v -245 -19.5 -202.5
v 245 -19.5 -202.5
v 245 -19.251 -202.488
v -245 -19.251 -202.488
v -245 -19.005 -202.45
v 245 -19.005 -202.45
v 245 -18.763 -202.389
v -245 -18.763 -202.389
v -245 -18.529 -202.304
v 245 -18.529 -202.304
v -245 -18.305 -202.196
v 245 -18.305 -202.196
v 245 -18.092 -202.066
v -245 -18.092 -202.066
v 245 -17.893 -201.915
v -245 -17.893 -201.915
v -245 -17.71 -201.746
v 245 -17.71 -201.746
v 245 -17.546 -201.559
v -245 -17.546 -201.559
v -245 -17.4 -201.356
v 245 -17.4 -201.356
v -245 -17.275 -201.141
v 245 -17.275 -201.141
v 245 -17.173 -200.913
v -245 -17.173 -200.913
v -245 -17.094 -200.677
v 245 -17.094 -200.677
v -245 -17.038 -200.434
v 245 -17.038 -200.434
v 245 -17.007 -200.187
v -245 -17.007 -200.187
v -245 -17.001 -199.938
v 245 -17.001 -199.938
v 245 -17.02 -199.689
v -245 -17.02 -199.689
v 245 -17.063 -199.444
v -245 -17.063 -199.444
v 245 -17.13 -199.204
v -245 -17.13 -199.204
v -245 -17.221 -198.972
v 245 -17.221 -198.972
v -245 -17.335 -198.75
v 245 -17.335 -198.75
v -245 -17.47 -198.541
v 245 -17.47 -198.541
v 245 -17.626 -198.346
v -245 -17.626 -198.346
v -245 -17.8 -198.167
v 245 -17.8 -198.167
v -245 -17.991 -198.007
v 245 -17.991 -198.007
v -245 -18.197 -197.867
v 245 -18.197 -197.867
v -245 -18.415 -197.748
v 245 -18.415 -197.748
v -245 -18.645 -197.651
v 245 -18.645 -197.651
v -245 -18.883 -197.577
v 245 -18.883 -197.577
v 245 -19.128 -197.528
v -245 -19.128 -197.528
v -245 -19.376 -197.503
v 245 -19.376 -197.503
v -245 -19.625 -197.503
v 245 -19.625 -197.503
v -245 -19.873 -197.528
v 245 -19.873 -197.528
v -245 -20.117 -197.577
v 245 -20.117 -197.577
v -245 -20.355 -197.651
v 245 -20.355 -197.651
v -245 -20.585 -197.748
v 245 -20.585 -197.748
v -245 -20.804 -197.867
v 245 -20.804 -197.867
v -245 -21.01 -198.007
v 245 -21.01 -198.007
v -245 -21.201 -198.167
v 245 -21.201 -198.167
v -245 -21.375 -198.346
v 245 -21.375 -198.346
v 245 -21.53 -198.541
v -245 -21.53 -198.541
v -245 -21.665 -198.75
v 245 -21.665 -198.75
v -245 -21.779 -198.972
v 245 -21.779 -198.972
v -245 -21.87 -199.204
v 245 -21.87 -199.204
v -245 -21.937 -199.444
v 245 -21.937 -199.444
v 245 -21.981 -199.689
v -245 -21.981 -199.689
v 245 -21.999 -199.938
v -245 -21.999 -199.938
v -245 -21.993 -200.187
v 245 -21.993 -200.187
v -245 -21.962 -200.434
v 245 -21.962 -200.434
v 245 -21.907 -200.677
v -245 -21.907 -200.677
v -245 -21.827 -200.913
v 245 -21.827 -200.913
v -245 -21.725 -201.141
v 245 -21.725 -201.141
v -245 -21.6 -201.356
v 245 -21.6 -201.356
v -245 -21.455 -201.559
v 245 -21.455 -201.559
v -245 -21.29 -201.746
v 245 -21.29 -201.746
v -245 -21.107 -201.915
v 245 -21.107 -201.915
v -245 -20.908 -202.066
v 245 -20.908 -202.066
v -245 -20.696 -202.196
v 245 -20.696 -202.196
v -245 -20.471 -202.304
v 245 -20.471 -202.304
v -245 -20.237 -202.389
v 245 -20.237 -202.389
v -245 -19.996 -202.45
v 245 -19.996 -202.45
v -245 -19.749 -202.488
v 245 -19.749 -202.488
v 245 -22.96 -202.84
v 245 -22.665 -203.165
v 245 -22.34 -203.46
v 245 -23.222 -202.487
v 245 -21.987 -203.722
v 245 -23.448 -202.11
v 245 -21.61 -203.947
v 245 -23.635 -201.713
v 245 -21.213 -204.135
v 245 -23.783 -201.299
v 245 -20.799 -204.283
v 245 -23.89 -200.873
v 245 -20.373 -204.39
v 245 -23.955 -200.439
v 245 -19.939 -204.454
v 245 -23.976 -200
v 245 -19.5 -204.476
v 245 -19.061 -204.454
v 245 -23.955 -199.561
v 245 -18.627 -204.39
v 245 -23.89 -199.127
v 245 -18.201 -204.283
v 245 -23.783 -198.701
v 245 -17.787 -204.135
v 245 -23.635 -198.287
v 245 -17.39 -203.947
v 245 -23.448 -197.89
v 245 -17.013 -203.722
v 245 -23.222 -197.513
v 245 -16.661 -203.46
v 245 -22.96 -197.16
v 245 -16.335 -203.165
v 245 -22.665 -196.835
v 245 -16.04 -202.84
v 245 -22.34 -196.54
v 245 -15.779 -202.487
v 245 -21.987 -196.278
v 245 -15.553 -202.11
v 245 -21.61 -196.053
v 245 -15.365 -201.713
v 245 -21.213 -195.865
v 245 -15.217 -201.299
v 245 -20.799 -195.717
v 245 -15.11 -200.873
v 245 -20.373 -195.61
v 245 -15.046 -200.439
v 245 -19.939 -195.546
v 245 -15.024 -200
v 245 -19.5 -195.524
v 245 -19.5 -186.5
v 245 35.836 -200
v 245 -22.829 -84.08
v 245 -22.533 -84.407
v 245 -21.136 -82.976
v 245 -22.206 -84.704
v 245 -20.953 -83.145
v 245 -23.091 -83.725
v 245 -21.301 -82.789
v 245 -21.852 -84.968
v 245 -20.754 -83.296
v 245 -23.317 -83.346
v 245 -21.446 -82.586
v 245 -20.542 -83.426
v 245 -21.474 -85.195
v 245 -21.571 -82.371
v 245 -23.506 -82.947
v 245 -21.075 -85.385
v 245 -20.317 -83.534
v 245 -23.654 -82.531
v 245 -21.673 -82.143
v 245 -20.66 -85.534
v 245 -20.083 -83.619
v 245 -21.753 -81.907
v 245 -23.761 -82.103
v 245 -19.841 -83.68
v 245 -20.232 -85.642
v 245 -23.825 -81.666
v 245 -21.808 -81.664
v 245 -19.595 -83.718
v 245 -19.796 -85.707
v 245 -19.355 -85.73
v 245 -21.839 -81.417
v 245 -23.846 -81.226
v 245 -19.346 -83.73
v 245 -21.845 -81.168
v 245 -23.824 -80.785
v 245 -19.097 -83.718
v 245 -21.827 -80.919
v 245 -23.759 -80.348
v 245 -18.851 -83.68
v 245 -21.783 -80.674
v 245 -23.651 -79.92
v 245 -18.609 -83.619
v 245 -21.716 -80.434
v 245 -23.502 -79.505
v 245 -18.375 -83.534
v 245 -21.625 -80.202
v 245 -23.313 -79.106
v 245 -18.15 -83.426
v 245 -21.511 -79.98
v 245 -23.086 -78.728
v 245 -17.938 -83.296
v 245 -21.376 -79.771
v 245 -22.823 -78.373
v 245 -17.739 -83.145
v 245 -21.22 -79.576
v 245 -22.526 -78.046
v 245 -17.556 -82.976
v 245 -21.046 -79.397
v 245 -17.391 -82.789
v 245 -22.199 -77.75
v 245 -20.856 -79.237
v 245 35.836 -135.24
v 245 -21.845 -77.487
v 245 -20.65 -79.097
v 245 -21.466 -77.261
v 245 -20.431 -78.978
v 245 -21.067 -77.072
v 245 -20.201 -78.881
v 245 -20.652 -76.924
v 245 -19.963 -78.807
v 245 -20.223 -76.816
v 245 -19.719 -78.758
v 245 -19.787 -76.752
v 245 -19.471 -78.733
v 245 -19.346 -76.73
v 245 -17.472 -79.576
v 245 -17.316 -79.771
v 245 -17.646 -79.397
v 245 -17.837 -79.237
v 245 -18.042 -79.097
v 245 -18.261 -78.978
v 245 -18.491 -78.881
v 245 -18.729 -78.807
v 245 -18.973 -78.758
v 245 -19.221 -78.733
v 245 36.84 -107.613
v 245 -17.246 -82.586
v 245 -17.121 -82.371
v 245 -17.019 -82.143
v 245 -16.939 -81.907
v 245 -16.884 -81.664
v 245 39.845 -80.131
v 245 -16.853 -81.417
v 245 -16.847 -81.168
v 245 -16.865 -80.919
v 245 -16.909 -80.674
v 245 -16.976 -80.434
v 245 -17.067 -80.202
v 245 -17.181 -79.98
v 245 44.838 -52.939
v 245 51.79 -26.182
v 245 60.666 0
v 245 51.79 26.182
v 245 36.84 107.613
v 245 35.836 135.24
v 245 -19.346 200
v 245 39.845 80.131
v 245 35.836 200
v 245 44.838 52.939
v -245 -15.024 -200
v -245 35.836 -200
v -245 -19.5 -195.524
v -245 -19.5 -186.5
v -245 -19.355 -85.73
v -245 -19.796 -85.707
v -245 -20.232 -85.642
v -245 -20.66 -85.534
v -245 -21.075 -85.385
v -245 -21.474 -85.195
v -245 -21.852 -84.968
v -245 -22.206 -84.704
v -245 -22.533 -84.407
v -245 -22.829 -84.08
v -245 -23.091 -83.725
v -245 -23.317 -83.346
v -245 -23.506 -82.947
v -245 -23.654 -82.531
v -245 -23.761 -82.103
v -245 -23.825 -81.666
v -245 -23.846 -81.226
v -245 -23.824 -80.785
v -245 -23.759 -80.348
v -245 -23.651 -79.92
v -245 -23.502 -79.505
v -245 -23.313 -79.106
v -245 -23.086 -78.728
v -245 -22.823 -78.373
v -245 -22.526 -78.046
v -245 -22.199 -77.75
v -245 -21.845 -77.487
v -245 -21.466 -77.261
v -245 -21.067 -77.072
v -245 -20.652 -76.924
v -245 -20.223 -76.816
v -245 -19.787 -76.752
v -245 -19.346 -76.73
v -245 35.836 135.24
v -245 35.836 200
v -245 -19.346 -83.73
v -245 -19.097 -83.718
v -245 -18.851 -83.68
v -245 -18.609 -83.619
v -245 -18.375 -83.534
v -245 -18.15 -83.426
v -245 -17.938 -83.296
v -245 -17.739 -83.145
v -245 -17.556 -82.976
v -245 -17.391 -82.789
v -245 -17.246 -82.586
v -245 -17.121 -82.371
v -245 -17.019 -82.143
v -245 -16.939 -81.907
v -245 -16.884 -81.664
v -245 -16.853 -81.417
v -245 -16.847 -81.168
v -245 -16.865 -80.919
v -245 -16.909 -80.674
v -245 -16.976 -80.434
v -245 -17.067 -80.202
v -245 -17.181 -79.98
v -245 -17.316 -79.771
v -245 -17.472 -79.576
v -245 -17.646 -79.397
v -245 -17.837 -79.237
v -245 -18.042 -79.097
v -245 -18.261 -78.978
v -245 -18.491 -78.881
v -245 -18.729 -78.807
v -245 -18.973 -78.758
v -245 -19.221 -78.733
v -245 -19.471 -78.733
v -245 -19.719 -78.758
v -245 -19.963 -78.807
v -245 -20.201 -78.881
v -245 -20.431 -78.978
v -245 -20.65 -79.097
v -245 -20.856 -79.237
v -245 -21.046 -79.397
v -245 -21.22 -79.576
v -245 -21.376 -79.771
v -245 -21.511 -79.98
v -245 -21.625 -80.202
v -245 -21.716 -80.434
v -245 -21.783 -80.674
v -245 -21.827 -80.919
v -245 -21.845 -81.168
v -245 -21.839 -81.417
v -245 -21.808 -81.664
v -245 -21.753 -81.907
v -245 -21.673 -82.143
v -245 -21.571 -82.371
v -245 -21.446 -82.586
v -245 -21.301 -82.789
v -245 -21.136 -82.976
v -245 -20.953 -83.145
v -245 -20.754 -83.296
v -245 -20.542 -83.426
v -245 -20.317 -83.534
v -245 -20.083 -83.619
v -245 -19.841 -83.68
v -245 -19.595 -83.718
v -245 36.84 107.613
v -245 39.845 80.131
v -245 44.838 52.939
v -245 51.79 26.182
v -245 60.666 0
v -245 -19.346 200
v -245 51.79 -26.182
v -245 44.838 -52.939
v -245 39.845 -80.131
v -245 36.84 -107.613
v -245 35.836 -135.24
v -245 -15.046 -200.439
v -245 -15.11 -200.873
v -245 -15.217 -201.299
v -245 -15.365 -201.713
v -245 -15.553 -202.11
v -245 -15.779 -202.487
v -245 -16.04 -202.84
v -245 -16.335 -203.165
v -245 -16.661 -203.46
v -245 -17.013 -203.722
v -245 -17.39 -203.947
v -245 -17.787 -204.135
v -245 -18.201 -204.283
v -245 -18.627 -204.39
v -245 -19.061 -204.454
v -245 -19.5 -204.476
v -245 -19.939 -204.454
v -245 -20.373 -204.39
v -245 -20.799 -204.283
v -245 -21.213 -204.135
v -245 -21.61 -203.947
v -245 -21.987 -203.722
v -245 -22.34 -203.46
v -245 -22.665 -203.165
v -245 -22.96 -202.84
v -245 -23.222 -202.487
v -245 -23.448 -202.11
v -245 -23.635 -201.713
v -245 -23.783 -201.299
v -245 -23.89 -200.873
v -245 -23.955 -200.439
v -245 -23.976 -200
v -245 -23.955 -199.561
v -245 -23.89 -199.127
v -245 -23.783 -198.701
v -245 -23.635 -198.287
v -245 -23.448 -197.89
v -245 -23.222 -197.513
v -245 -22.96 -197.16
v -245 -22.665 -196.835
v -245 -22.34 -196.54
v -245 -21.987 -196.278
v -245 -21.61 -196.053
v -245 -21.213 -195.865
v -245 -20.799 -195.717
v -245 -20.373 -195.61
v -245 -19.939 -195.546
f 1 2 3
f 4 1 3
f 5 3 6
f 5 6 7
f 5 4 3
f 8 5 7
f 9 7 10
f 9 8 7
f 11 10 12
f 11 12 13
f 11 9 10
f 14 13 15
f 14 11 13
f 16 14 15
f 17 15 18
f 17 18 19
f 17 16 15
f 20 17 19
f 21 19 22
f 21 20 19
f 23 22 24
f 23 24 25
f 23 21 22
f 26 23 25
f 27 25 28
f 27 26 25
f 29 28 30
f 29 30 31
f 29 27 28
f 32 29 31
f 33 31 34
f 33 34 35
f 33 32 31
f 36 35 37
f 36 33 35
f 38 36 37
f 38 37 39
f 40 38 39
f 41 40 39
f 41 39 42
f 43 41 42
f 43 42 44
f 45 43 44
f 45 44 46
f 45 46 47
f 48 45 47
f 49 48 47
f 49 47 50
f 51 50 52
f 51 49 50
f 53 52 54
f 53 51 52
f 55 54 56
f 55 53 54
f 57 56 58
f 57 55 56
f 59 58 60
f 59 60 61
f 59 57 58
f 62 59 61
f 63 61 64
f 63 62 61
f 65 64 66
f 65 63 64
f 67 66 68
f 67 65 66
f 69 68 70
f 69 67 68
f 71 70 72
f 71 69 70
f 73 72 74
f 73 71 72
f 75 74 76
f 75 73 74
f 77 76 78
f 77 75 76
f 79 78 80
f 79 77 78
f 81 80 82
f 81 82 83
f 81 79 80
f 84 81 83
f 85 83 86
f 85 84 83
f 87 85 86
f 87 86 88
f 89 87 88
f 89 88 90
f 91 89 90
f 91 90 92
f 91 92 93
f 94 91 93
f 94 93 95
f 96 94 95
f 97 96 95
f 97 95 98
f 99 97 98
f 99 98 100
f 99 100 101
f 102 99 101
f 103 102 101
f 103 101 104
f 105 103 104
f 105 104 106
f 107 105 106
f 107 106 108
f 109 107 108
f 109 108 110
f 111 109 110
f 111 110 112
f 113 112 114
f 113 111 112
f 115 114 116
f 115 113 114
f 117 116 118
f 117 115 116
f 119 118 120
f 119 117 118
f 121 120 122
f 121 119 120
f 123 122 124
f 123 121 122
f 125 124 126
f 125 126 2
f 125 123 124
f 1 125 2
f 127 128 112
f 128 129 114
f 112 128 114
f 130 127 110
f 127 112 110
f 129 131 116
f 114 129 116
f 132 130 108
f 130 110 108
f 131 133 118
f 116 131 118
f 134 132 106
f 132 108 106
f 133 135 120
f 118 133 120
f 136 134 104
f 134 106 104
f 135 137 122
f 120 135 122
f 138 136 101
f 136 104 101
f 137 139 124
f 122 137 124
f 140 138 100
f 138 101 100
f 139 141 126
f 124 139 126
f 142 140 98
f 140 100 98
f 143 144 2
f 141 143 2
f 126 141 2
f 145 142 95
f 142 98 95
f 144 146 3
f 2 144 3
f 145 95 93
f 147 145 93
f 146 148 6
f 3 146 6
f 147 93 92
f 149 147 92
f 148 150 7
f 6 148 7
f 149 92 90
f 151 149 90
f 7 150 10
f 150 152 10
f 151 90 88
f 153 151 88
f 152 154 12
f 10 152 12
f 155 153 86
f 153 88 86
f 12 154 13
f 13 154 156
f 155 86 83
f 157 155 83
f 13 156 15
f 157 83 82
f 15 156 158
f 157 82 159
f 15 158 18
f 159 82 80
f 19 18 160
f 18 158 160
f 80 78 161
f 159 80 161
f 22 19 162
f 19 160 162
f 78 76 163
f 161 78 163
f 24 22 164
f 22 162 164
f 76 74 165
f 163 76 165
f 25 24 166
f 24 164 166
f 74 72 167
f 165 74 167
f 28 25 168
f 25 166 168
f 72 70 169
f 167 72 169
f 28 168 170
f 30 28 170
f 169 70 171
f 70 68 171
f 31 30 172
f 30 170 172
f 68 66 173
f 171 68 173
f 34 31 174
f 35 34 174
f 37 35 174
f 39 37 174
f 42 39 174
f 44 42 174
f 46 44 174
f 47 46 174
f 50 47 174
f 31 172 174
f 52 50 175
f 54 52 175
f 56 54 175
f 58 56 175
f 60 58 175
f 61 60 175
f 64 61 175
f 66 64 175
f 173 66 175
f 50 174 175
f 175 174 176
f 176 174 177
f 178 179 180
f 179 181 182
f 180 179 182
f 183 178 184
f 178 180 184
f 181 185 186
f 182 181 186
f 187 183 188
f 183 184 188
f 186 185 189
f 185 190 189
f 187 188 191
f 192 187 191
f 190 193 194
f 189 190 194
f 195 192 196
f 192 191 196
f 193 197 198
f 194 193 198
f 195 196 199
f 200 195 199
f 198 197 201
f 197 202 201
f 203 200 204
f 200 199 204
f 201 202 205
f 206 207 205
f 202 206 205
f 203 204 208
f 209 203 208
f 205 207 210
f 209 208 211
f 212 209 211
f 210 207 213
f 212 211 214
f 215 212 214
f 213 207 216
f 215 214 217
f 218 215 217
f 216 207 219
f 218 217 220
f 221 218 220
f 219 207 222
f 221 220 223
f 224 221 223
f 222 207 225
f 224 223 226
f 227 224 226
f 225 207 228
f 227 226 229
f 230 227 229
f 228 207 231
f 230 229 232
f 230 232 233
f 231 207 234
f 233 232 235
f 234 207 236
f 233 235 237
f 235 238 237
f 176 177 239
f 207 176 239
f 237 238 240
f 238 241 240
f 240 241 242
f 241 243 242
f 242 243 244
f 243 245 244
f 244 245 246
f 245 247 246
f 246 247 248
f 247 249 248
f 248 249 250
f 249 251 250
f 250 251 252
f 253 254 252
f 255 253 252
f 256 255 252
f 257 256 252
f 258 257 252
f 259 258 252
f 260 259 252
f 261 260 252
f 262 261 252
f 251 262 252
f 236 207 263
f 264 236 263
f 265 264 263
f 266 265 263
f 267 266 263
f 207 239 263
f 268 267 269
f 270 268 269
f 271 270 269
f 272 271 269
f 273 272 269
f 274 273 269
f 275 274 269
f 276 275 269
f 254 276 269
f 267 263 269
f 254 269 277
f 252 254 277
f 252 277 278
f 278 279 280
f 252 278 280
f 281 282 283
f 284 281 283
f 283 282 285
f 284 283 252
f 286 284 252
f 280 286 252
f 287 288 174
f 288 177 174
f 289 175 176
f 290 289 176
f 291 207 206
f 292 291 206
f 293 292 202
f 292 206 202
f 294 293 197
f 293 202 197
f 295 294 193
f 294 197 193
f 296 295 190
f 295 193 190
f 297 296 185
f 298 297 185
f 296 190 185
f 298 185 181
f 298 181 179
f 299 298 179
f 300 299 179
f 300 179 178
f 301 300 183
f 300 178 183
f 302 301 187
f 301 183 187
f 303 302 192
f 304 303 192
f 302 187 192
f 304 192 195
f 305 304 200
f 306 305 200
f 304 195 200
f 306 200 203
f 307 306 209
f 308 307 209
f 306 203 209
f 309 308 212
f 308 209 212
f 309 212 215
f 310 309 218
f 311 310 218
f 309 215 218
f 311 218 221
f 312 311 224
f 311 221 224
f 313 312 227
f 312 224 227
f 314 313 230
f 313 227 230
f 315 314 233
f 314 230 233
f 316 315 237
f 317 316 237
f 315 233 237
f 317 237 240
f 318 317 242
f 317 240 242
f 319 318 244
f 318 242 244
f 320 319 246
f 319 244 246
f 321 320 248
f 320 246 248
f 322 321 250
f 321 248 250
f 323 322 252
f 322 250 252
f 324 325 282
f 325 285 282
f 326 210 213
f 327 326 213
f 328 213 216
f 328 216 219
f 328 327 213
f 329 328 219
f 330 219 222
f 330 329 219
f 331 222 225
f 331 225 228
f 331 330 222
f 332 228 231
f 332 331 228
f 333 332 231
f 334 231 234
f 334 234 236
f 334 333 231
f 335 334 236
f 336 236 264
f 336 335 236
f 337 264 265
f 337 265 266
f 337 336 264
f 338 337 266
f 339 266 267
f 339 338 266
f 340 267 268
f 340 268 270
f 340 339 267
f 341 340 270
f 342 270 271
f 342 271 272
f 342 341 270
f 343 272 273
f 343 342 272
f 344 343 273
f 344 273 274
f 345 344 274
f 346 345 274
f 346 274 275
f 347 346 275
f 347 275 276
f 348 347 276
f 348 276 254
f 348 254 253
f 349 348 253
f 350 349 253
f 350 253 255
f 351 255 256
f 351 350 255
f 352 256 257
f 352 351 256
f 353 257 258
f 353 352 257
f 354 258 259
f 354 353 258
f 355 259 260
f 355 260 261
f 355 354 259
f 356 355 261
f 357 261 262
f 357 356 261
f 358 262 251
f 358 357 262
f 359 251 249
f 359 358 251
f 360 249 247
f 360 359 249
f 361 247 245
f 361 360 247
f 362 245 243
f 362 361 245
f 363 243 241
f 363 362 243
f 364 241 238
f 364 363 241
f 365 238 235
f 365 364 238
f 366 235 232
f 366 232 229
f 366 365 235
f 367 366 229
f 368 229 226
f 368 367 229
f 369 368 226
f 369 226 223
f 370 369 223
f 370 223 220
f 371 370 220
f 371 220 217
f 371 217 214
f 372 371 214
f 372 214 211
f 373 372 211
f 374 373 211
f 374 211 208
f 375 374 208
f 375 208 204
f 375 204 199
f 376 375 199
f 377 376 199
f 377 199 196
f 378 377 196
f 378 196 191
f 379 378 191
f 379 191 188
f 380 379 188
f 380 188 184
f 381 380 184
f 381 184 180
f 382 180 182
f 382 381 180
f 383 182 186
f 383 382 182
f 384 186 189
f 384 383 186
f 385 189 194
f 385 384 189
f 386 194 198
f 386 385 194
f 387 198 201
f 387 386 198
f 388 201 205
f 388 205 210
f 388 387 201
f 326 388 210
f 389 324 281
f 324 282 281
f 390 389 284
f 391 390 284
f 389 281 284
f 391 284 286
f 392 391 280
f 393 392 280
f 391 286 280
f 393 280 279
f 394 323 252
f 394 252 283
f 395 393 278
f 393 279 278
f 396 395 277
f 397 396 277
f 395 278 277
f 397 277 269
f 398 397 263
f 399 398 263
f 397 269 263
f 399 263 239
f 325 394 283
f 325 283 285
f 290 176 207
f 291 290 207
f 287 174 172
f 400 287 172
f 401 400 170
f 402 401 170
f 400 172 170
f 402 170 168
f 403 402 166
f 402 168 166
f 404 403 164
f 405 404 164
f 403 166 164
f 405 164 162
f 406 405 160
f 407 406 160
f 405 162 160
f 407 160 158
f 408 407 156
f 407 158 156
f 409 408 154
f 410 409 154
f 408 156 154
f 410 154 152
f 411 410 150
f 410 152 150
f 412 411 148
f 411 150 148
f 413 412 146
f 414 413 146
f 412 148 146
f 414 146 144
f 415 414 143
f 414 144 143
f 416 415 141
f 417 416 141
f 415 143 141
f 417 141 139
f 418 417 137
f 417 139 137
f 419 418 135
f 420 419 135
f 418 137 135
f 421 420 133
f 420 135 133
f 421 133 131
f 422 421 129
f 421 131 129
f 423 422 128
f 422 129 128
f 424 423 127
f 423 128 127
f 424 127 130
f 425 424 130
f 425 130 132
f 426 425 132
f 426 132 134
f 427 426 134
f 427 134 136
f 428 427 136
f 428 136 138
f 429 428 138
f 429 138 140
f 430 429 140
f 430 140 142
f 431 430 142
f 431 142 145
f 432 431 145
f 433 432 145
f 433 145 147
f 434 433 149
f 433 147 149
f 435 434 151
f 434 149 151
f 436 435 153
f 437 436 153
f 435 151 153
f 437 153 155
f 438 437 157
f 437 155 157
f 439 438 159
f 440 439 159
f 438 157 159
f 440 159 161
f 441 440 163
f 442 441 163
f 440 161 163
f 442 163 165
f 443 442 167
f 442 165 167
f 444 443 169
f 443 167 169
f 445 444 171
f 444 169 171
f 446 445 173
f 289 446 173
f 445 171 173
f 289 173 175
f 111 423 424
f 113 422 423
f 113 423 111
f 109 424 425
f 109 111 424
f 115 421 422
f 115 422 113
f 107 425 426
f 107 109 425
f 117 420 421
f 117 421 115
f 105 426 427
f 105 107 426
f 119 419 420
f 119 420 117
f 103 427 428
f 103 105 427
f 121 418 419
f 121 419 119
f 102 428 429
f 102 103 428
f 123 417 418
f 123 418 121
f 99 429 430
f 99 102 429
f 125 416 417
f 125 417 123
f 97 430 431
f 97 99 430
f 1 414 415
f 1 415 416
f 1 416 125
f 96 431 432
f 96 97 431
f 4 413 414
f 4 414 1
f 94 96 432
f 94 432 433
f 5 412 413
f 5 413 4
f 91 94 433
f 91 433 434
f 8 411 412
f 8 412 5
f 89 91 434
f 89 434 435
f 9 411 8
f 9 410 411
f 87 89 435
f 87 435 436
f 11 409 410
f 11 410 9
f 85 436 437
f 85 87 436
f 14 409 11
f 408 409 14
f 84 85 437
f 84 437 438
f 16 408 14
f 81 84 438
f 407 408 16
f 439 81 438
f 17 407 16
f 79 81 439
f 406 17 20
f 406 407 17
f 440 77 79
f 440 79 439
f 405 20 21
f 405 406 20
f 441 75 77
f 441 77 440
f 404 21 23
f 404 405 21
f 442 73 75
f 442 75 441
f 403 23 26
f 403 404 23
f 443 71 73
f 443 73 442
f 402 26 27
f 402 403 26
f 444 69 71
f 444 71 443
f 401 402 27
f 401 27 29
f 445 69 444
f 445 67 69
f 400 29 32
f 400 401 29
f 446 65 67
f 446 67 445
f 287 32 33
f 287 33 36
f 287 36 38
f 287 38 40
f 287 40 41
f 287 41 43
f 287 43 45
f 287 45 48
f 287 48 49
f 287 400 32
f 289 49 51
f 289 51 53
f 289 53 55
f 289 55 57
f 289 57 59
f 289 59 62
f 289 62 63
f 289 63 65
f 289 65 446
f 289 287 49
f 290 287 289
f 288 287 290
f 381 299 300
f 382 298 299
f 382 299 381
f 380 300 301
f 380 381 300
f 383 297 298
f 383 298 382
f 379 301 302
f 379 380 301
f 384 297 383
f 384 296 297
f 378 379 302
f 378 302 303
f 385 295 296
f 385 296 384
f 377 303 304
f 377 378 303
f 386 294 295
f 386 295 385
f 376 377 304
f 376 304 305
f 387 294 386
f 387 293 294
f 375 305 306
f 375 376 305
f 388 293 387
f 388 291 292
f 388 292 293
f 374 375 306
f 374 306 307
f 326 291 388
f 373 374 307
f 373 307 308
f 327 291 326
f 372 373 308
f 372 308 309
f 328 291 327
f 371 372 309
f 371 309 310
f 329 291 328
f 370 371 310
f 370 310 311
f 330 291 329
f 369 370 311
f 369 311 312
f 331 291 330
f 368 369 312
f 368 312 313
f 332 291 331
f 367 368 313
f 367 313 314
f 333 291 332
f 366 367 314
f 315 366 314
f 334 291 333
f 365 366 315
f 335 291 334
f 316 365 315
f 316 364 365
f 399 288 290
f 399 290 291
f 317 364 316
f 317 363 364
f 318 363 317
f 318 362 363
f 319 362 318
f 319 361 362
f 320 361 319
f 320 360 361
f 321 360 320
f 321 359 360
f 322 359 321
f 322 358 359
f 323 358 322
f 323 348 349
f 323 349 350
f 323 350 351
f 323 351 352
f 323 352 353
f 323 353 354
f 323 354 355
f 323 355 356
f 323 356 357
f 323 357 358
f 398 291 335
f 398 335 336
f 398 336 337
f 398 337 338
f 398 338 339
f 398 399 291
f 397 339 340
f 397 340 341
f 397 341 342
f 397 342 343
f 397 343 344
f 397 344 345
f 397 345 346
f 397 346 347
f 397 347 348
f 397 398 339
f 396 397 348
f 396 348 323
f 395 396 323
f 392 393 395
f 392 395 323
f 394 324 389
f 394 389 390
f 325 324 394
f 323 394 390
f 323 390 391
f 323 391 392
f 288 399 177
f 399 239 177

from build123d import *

# Parameters (mm, degrees)
ESBO_O1_R                = 2.5
RESSALTO_EXTRUS_O1_DEPTH = 245


with BuildPart() as part:
    # Esboço1 → Ressalto-extrusão1 (new, symmetric)
    with BuildSketch(Plane(origin=(0, 0, 0), x_dir=(0, 0, -1), z_dir=(1, 0, 0))):
        with BuildLine():
            Line((-200, -19.346040211), (-200, 35.835787631))
            Line((-200, 35.835787631), (-135.24, 35.835787631))
            ThreePointArc((-135.24, 35.835787631), (-66.489751819, 42.094735918), (0, 60.665787631))
            ThreePointArc((0, 60.665787631), (66.489751819, 42.094735918), (135.24, 35.835787631))
            Line((135.24, 35.835787631), (200, 35.835787631))
            Line((200, 35.835787631), (200, -15.024212369))
            ThreePointArc((200, -15.024212369), (203.164975379, -22.665138853), (195.524048894, -19.500163474))
            Line((195.524048894, -19.500163474), (186.500073192, -19.500163474))
            Line((186.500073192, -19.500163474), (85.729991436, -19.354819463))
            ThreePointArc((85.729991436, -19.354819463), (81.225610372, -23.84603807), (76.73, -19.346040211))
            Line((76.73, -19.346040211), (-200, -19.346040211))
        make_face()
        with Locations((81.23, -19.346040211)):
            Circle(ESBO_O1_R, mode=Mode.SUBTRACT)
        with Locations((200, -19.500163474)):
            Circle(ESBO_O1_R, mode=Mode.SUBTRACT)
    extrude(amount=RESSALTO_EXTRUS_O1_DEPTH, both=True)


solid = part.part
